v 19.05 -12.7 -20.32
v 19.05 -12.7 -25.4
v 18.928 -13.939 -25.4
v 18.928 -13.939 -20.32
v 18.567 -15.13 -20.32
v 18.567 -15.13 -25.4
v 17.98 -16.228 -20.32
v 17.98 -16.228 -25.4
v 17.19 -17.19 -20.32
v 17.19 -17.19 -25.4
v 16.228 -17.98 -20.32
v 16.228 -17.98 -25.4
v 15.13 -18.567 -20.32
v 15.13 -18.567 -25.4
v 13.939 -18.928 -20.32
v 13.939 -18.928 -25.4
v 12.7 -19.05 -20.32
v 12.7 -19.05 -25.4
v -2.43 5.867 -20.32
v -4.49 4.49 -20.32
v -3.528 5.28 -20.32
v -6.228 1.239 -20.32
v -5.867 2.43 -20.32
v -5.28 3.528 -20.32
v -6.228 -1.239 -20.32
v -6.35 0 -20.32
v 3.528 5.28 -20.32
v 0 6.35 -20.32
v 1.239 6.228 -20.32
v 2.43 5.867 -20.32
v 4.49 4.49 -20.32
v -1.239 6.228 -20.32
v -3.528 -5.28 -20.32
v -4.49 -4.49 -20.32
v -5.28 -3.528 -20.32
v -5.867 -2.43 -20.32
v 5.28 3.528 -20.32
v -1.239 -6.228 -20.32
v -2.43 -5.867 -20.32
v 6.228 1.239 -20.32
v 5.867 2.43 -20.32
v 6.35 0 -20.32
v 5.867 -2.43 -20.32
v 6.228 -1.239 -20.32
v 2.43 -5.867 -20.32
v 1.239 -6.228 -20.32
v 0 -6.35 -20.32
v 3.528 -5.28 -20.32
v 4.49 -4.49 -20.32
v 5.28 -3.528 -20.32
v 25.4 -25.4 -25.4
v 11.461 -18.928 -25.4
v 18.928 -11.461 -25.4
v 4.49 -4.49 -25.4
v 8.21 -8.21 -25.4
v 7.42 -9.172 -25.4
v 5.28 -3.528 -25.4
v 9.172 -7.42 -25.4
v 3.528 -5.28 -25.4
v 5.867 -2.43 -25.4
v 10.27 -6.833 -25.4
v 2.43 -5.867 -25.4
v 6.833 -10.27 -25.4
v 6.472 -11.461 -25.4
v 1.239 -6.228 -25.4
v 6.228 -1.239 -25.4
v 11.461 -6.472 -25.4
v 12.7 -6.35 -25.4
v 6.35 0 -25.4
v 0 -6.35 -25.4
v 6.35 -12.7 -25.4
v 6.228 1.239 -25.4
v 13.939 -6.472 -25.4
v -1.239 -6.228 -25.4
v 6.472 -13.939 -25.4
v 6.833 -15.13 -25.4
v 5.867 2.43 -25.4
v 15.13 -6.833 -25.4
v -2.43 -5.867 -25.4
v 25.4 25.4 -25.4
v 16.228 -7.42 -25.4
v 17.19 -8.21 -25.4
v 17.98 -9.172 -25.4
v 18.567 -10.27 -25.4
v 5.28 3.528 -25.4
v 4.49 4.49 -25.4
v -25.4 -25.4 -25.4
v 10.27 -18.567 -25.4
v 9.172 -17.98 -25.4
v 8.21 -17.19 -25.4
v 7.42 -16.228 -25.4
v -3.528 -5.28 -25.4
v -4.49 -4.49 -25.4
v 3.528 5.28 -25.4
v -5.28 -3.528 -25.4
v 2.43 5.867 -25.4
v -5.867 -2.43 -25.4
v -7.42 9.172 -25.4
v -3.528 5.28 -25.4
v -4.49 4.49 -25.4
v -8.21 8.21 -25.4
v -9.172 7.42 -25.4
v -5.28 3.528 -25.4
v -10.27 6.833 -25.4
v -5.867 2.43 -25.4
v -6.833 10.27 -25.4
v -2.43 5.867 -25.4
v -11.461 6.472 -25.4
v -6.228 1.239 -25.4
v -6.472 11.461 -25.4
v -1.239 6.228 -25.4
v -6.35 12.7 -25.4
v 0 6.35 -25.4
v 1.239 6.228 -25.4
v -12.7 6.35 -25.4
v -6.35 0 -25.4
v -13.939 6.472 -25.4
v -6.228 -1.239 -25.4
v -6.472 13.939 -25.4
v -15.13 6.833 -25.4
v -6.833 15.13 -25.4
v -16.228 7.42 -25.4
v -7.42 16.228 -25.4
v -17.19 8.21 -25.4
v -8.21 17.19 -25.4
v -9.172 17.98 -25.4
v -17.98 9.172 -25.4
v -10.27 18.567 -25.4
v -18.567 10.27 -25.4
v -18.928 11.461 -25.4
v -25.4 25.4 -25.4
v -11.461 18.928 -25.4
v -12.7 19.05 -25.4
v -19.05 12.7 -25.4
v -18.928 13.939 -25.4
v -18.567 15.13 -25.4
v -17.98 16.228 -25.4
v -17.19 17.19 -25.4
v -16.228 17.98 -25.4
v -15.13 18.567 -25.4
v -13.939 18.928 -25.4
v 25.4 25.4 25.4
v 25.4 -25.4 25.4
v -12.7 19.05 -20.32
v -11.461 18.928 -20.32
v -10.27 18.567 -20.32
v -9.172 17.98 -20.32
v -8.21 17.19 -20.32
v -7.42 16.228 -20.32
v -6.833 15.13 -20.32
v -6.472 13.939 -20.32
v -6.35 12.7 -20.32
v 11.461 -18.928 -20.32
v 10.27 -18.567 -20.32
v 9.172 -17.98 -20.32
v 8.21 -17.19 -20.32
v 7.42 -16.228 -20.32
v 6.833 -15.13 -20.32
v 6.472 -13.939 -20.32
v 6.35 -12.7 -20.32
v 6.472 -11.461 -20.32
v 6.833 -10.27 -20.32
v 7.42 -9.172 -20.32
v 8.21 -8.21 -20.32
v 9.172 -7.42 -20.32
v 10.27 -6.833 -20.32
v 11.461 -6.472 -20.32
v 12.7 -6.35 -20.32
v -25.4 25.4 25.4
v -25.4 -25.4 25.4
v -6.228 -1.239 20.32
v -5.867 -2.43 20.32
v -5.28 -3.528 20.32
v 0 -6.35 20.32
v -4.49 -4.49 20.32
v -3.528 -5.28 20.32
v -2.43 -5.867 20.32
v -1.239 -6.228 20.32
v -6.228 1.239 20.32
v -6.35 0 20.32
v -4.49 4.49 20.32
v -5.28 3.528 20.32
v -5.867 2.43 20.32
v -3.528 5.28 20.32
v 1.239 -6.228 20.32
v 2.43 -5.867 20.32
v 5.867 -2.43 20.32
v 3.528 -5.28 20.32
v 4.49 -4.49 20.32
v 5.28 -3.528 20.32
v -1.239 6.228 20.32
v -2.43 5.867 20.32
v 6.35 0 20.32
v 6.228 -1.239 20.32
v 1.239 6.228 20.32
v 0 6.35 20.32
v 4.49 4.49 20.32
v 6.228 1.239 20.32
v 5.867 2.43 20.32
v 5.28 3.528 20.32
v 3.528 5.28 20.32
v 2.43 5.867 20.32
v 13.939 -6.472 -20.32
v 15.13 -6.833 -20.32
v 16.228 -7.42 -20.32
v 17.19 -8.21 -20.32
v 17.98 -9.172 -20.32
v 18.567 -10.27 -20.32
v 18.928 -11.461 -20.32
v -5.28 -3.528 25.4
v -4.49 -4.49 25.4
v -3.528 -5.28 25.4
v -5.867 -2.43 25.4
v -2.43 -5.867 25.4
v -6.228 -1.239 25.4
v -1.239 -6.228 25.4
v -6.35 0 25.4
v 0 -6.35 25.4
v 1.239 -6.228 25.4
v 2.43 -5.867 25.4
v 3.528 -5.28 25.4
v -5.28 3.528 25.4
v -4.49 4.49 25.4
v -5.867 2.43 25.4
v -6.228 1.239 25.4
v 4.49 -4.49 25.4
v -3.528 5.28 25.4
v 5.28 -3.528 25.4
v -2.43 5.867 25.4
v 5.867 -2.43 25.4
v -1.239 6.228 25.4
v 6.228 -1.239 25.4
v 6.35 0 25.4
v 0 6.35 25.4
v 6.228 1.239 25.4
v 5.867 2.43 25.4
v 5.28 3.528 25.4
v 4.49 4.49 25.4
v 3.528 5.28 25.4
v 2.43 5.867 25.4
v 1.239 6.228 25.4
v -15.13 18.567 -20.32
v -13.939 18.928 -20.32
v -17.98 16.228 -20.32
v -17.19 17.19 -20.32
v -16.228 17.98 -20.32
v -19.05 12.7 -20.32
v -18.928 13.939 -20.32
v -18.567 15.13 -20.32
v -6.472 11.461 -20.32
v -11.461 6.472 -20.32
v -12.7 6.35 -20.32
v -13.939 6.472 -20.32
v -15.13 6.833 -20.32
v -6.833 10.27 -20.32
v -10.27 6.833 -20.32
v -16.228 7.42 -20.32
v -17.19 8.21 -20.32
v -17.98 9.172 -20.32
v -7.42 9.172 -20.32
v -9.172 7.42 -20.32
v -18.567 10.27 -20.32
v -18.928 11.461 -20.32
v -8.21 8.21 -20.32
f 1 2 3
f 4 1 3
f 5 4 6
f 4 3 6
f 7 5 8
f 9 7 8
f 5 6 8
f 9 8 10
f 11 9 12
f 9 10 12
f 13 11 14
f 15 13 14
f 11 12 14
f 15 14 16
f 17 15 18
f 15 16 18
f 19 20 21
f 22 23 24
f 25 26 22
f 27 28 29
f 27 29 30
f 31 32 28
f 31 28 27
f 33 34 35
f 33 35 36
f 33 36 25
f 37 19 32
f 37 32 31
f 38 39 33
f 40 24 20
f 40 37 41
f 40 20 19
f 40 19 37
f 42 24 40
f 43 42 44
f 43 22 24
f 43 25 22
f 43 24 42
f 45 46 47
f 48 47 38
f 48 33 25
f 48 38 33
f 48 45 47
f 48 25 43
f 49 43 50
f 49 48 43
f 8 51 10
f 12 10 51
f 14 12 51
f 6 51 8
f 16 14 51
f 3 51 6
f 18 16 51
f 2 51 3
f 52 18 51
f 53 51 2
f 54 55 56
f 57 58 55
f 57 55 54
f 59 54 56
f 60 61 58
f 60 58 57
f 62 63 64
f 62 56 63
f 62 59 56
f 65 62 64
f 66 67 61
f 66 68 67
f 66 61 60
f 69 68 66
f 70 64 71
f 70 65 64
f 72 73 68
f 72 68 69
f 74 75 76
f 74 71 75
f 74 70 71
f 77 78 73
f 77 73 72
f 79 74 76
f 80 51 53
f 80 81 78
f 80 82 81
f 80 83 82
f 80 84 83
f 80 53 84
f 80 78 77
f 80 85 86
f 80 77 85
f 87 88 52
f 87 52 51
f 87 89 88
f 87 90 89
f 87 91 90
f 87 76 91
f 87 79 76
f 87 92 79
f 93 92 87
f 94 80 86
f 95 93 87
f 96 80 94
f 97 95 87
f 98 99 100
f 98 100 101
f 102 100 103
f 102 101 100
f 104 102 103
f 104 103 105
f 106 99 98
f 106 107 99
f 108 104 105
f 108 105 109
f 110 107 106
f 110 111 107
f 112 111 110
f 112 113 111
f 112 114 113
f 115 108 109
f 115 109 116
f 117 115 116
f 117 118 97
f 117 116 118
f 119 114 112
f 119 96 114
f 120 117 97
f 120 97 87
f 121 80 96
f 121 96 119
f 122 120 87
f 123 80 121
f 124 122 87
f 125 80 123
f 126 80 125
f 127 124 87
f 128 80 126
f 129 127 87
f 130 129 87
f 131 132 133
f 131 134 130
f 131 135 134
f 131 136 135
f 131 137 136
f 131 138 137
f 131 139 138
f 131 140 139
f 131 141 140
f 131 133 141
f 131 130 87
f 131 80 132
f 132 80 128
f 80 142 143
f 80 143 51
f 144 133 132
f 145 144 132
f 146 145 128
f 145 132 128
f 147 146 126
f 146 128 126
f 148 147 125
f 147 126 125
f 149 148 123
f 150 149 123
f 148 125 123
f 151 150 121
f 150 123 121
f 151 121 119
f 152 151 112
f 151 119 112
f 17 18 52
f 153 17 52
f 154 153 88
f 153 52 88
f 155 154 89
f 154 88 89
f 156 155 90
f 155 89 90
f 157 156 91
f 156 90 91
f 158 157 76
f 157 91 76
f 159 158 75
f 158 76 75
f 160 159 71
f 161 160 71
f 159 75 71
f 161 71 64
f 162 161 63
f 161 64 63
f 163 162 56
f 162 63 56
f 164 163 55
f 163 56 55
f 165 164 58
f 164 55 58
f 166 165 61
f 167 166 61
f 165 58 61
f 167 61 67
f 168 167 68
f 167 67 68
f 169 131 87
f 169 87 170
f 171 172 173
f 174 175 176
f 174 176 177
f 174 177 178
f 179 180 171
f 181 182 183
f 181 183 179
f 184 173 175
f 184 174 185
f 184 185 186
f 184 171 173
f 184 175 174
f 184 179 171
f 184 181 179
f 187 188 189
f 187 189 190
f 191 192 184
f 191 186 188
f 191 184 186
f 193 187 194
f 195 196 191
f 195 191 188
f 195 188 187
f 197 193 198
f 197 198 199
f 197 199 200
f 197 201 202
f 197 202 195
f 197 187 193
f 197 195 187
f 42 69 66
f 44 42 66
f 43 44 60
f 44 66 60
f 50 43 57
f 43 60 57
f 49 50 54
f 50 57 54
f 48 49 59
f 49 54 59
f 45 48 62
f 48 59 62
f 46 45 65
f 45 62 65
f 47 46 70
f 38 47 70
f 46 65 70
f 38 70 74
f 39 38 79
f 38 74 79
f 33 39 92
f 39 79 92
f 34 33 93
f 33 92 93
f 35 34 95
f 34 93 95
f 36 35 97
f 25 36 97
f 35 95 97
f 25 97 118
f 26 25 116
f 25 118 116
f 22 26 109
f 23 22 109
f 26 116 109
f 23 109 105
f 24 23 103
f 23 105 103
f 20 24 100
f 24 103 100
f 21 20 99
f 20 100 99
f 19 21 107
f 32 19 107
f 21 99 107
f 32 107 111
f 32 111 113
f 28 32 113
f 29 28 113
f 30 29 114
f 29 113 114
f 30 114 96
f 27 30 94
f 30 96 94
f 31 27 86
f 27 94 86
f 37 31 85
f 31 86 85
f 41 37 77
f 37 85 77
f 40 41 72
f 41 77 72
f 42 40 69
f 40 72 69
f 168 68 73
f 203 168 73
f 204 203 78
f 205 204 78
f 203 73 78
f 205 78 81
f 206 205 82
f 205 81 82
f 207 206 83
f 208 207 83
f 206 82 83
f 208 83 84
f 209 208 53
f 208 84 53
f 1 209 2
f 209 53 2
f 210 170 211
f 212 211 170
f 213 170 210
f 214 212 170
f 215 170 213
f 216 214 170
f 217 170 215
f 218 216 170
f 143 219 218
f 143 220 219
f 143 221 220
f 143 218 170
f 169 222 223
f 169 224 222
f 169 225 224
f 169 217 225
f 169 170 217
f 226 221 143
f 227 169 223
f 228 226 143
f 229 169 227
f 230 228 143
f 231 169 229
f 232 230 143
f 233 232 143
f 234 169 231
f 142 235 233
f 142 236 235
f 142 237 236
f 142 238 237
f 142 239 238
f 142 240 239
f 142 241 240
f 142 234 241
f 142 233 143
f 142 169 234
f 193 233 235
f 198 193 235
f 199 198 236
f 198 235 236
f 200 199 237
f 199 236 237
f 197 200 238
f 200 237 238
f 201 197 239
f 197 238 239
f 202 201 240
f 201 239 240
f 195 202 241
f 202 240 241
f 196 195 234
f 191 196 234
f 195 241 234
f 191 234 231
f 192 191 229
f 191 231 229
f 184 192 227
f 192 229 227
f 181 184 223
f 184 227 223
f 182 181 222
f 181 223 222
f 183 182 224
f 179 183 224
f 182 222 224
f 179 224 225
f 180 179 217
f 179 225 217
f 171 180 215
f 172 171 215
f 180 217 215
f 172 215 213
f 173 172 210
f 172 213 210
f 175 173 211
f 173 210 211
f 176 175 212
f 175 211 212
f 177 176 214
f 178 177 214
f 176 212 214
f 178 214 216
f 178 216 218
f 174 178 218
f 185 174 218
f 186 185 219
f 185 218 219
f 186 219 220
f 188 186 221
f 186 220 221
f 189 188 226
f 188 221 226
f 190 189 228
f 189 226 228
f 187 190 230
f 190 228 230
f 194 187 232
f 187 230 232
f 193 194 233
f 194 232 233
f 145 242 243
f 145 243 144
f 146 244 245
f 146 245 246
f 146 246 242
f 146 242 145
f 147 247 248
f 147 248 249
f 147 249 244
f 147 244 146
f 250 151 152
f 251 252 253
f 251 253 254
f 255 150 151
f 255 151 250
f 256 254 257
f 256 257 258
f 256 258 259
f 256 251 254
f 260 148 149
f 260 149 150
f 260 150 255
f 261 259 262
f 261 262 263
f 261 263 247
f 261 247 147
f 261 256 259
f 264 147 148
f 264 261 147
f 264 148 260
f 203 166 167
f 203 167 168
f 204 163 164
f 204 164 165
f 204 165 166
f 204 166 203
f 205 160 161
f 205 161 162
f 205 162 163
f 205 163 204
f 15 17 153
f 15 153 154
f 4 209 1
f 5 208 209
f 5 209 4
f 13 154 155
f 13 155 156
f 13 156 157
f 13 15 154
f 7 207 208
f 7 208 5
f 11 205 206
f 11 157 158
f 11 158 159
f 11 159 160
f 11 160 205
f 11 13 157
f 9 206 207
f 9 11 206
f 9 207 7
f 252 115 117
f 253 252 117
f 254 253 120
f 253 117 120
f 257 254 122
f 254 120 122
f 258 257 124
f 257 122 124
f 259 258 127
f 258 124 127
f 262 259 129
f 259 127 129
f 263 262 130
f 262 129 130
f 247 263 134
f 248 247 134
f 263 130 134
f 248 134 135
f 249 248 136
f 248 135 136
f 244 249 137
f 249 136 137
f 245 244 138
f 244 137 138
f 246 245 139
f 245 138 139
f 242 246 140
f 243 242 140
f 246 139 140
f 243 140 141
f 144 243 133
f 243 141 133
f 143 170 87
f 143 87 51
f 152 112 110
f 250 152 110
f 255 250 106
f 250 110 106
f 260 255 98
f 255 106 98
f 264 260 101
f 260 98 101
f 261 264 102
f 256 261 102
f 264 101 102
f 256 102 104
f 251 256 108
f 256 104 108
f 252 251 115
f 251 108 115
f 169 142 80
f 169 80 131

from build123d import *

# Parameters (mm, degrees)
F1_DEPTH  = 25.4
F1_FACE_W = 50.8
F1_FACE_H = 50.8
F2_DEPTH  = 25.4
F3_R      = 6.35
F4_DEPTH  = 5.08
F6_DEPTH  = 5.08
F8_DEPTH  = 5.08
F9_DEPTH  = 6.35


with BuildPart() as f1:
    # F0 (on Front) → F1 (new body)
    with BuildSketch(Plane.XZ):
        Polygon((-25.4, 25.4), (-25.4, 0), (-25.4, -25.4), (25.4, -25.4), (25.4, 25.4), align=None)
    extrude(amount=F1_DEPTH)

    # F1_face (on face) → F2 (join)
    with BuildSketch(Plane(origin=(0, 0, 0), x_dir=(1, 0, 0), z_dir=(0, 1, 0))):
        Rectangle(F1_FACE_W, F1_FACE_H)
    extrude(amount=F2_DEPTH)

    # F3 (on face) → F4 (cut)
    with BuildSketch(Plane.XY.offset(25.4)):
        Circle(F3_R)
    extrude(amount=-F4_DEPTH, mode=Mode.SUBTRACT)

    # F5 (on face) → F6 (cut)
    with BuildSketch(Plane(origin=(0, 25.4, 0), x_dir=(-1, 0, 0), z_dir=(0, 1, 0))):
        with BuildLine():
            Line((-12.7, 0), (0, 0))
            Line((0, 0), (12.7, 0))
            Line((12.7, 0), (25.4, 0))
            Line((25.4, 0), (25.4, 25.4))
            Line((25.4, 25.4), (-12.7, 25.4))
            Line((-12.7, 25.4), (-12.7, 19.05))
            ThreePointArc((-12.7, 19.05), (-8.209872, 17.190128), (-6.35, 12.7))
            ThreePointArc((-6.35, 12.7), (-8.209872, 8.209872), (-12.7, 6.35))
            Line((-12.7, 6.35), (-12.7, 0))
        make_face()
        with BuildLine():
            Line((-25.4, 0), (-12.7, 0))
            Line((-12.7, 0), (-12.7, 6.35))
            ThreePointArc((-12.7, 6.35), (-19.05, 12.7), (-12.7, 19.05))
            Line((-12.7, 19.05), (-12.7, 25.4))
            Line((-12.7, 25.4), (-25.4, 25.4))
            Line((-25.4, 25.4), (-25.4, 0))
        make_face()
        with BuildLine():
            Line((25.4, 0), (12.7, 0))
            Line((12.7, 0), (12.7, -6.23736))
            ThreePointArc((12.7, -6.23736), (17.269776, -8.130224), (19.16264, -12.7))
            ThreePointArc((19.16264, -12.7), (17.269776, -17.269776), (12.7, -19.16264))
            Line((12.7, -19.16264), (12.7, -25.4))
            Line((12.7, -25.4), (25.4, -25.4))
            Line((25.4, -25.4), (25.4, 0))
        make_face()
        with BuildLine():
            Line((12.7, 0), (0, 0))
            Line((0, 0), (-12.7, 0))
            Line((-12.7, 0), (-25.4, 0))
            Line((-25.4, 0), (-25.4, -25.4))
            Line((-25.4, -25.4), (12.7, -25.4))
            Line((12.7, -25.4), (12.7, -19.16264))
            ThreePointArc((12.7, -19.16264), (6.23736, -12.7), (12.7, -6.23736))
            Line((12.7, -6.23736), (12.7, 0))
        make_face()
    extrude(amount=-F6_DEPTH, mode=Mode.SUBTRACT)

    # F7 (on face) → F8 (cut)
    with BuildSketch(Plane(origin=(0, 0, -25.4), x_dir=(1, 0, 0), z_dir=(0, 0, -1))):
        with BuildLine():
            Line((-12.7, -12.7), (-12.7, -6.35))
            ThreePointArc((-12.7, -6.35), (-19.05, -12.7), (-12.7, -19.05))
            Line((-12.7, -19.05), (-12.7, -12.7))
        make_face()
        with BuildLine():
            ThreePointArc((-6.35, -12.7), (-8.209872, -8.209872), (-12.7, -6.35))
            Line((-12.7, -6.35), (-12.7, -12.7))
            Line((-12.7, -12.7), (-12.7, -19.05))
            ThreePointArc((-12.7, -19.05), (-8.209872, -17.190128), (-6.35, -12.7))
        make_face()
        with BuildLine():
            Line((6.35, 0), (0, 0))
            Line((0, 0), (-6.35, 0))
            ThreePointArc((-6.35, 0), (0, -6.35), (6.35, 0))
        make_face()
        with BuildLine():
            Line((-6.35, 0), (0, 0))
            Line((0, 0), (6.35, 0))
            ThreePointArc((6.35, 0), (0, 6.35), (-6.35, 0))
        make_face()
        with BuildLine():
            Line((12.7, 12.7), (12.7, 6.35))
            ThreePointArc((12.7, 6.35), (17.190128, 8.209872), (19.05, 12.7))
            ThreePointArc((19.05, 12.7), (17.190128, 17.190128), (12.7, 19.05))
            Line((12.7, 19.05), (12.7, 12.7))
        make_face()
        with BuildLine():
            ThreePointArc((12.7, 19.05), (6.35, 12.7), (12.7, 6.35))
            Line((12.7, 6.35), (12.7, 12.7))
            Line((12.7, 12.7), (12.7, 19.05))
        make_face()
    extrude(amount=-F8_DEPTH, mode=Mode.SUBTRACT)

    # F5 (on face) → F9 (join)
    with BuildSketch(Plane(origin=(0, 25.4, 0), x_dir=(-1, 0, 0), z_dir=(0, 1, 0))):
        with BuildLine():
            Line((-12.7, 0), (0, 0))
            Line((0, 0), (12.7, 0))
            Line((12.7, 0), (25.4, 0))
            Line((25.4, 0), (25.4, 25.4))
            Line((25.4, 25.4), (-12.7, 25.4))
            Line((-12.7, 25.4), (-12.7, 19.05))
            ThreePointArc((-12.7, 19.05), (-8.209872, 17.190128), (-6.35, 12.7))
            ThreePointArc((-6.35, 12.7), (-8.209872, 8.209872), (-12.7, 6.35))
            Line((-12.7, 6.35), (-12.7, 0))
        make_face()
        with BuildLine():
            Line((12.7, 0), (0, 0))
            Line((0, 0), (-12.7, 0))
            Line((-12.7, 0), (-25.4, 0))
            Line((-25.4, 0), (-25.4, -25.4))
            Line((-25.4, -25.4), (12.7, -25.4))
            Line((12.7, -25.4), (12.7, -19.16264))
            ThreePointArc((12.7, -19.16264), (6.23736, -12.7), (12.7, -6.23736))
            Line((12.7, -6.23736), (12.7, 0))
        make_face()
        with BuildLine():
            Line((25.4, 0), (12.7, 0))
            Line((12.7, 0), (12.7, -6.23736))
            ThreePointArc((12.7, -6.23736), (17.269776, -8.130224), (19.16264, -12.7))
            ThreePointArc((19.16264, -12.7), (17.269776, -17.269776), (12.7, -19.16264))
            Line((12.7, -19.16264), (12.7, -25.4))
            Line((12.7, -25.4), (25.4, -25.4))
            Line((25.4, -25.4), (25.4, 0))
        make_face()
        with BuildLine():
            Line((-25.4, 0), (-12.7, 0))
            Line((-12.7, 0), (-12.7, 6.35))
            ThreePointArc((-12.7, 6.35), (-19.05, 12.7), (-12.7, 19.05))
            Line((-12.7, 19.05), (-12.7, 25.4))
            Line((-12.7, 25.4), (-25.4, 25.4))
            Line((-25.4, 25.4), (-25.4, 0))
        make_face()
    extrude(amount=-F9_DEPTH)


solid = f1.part
